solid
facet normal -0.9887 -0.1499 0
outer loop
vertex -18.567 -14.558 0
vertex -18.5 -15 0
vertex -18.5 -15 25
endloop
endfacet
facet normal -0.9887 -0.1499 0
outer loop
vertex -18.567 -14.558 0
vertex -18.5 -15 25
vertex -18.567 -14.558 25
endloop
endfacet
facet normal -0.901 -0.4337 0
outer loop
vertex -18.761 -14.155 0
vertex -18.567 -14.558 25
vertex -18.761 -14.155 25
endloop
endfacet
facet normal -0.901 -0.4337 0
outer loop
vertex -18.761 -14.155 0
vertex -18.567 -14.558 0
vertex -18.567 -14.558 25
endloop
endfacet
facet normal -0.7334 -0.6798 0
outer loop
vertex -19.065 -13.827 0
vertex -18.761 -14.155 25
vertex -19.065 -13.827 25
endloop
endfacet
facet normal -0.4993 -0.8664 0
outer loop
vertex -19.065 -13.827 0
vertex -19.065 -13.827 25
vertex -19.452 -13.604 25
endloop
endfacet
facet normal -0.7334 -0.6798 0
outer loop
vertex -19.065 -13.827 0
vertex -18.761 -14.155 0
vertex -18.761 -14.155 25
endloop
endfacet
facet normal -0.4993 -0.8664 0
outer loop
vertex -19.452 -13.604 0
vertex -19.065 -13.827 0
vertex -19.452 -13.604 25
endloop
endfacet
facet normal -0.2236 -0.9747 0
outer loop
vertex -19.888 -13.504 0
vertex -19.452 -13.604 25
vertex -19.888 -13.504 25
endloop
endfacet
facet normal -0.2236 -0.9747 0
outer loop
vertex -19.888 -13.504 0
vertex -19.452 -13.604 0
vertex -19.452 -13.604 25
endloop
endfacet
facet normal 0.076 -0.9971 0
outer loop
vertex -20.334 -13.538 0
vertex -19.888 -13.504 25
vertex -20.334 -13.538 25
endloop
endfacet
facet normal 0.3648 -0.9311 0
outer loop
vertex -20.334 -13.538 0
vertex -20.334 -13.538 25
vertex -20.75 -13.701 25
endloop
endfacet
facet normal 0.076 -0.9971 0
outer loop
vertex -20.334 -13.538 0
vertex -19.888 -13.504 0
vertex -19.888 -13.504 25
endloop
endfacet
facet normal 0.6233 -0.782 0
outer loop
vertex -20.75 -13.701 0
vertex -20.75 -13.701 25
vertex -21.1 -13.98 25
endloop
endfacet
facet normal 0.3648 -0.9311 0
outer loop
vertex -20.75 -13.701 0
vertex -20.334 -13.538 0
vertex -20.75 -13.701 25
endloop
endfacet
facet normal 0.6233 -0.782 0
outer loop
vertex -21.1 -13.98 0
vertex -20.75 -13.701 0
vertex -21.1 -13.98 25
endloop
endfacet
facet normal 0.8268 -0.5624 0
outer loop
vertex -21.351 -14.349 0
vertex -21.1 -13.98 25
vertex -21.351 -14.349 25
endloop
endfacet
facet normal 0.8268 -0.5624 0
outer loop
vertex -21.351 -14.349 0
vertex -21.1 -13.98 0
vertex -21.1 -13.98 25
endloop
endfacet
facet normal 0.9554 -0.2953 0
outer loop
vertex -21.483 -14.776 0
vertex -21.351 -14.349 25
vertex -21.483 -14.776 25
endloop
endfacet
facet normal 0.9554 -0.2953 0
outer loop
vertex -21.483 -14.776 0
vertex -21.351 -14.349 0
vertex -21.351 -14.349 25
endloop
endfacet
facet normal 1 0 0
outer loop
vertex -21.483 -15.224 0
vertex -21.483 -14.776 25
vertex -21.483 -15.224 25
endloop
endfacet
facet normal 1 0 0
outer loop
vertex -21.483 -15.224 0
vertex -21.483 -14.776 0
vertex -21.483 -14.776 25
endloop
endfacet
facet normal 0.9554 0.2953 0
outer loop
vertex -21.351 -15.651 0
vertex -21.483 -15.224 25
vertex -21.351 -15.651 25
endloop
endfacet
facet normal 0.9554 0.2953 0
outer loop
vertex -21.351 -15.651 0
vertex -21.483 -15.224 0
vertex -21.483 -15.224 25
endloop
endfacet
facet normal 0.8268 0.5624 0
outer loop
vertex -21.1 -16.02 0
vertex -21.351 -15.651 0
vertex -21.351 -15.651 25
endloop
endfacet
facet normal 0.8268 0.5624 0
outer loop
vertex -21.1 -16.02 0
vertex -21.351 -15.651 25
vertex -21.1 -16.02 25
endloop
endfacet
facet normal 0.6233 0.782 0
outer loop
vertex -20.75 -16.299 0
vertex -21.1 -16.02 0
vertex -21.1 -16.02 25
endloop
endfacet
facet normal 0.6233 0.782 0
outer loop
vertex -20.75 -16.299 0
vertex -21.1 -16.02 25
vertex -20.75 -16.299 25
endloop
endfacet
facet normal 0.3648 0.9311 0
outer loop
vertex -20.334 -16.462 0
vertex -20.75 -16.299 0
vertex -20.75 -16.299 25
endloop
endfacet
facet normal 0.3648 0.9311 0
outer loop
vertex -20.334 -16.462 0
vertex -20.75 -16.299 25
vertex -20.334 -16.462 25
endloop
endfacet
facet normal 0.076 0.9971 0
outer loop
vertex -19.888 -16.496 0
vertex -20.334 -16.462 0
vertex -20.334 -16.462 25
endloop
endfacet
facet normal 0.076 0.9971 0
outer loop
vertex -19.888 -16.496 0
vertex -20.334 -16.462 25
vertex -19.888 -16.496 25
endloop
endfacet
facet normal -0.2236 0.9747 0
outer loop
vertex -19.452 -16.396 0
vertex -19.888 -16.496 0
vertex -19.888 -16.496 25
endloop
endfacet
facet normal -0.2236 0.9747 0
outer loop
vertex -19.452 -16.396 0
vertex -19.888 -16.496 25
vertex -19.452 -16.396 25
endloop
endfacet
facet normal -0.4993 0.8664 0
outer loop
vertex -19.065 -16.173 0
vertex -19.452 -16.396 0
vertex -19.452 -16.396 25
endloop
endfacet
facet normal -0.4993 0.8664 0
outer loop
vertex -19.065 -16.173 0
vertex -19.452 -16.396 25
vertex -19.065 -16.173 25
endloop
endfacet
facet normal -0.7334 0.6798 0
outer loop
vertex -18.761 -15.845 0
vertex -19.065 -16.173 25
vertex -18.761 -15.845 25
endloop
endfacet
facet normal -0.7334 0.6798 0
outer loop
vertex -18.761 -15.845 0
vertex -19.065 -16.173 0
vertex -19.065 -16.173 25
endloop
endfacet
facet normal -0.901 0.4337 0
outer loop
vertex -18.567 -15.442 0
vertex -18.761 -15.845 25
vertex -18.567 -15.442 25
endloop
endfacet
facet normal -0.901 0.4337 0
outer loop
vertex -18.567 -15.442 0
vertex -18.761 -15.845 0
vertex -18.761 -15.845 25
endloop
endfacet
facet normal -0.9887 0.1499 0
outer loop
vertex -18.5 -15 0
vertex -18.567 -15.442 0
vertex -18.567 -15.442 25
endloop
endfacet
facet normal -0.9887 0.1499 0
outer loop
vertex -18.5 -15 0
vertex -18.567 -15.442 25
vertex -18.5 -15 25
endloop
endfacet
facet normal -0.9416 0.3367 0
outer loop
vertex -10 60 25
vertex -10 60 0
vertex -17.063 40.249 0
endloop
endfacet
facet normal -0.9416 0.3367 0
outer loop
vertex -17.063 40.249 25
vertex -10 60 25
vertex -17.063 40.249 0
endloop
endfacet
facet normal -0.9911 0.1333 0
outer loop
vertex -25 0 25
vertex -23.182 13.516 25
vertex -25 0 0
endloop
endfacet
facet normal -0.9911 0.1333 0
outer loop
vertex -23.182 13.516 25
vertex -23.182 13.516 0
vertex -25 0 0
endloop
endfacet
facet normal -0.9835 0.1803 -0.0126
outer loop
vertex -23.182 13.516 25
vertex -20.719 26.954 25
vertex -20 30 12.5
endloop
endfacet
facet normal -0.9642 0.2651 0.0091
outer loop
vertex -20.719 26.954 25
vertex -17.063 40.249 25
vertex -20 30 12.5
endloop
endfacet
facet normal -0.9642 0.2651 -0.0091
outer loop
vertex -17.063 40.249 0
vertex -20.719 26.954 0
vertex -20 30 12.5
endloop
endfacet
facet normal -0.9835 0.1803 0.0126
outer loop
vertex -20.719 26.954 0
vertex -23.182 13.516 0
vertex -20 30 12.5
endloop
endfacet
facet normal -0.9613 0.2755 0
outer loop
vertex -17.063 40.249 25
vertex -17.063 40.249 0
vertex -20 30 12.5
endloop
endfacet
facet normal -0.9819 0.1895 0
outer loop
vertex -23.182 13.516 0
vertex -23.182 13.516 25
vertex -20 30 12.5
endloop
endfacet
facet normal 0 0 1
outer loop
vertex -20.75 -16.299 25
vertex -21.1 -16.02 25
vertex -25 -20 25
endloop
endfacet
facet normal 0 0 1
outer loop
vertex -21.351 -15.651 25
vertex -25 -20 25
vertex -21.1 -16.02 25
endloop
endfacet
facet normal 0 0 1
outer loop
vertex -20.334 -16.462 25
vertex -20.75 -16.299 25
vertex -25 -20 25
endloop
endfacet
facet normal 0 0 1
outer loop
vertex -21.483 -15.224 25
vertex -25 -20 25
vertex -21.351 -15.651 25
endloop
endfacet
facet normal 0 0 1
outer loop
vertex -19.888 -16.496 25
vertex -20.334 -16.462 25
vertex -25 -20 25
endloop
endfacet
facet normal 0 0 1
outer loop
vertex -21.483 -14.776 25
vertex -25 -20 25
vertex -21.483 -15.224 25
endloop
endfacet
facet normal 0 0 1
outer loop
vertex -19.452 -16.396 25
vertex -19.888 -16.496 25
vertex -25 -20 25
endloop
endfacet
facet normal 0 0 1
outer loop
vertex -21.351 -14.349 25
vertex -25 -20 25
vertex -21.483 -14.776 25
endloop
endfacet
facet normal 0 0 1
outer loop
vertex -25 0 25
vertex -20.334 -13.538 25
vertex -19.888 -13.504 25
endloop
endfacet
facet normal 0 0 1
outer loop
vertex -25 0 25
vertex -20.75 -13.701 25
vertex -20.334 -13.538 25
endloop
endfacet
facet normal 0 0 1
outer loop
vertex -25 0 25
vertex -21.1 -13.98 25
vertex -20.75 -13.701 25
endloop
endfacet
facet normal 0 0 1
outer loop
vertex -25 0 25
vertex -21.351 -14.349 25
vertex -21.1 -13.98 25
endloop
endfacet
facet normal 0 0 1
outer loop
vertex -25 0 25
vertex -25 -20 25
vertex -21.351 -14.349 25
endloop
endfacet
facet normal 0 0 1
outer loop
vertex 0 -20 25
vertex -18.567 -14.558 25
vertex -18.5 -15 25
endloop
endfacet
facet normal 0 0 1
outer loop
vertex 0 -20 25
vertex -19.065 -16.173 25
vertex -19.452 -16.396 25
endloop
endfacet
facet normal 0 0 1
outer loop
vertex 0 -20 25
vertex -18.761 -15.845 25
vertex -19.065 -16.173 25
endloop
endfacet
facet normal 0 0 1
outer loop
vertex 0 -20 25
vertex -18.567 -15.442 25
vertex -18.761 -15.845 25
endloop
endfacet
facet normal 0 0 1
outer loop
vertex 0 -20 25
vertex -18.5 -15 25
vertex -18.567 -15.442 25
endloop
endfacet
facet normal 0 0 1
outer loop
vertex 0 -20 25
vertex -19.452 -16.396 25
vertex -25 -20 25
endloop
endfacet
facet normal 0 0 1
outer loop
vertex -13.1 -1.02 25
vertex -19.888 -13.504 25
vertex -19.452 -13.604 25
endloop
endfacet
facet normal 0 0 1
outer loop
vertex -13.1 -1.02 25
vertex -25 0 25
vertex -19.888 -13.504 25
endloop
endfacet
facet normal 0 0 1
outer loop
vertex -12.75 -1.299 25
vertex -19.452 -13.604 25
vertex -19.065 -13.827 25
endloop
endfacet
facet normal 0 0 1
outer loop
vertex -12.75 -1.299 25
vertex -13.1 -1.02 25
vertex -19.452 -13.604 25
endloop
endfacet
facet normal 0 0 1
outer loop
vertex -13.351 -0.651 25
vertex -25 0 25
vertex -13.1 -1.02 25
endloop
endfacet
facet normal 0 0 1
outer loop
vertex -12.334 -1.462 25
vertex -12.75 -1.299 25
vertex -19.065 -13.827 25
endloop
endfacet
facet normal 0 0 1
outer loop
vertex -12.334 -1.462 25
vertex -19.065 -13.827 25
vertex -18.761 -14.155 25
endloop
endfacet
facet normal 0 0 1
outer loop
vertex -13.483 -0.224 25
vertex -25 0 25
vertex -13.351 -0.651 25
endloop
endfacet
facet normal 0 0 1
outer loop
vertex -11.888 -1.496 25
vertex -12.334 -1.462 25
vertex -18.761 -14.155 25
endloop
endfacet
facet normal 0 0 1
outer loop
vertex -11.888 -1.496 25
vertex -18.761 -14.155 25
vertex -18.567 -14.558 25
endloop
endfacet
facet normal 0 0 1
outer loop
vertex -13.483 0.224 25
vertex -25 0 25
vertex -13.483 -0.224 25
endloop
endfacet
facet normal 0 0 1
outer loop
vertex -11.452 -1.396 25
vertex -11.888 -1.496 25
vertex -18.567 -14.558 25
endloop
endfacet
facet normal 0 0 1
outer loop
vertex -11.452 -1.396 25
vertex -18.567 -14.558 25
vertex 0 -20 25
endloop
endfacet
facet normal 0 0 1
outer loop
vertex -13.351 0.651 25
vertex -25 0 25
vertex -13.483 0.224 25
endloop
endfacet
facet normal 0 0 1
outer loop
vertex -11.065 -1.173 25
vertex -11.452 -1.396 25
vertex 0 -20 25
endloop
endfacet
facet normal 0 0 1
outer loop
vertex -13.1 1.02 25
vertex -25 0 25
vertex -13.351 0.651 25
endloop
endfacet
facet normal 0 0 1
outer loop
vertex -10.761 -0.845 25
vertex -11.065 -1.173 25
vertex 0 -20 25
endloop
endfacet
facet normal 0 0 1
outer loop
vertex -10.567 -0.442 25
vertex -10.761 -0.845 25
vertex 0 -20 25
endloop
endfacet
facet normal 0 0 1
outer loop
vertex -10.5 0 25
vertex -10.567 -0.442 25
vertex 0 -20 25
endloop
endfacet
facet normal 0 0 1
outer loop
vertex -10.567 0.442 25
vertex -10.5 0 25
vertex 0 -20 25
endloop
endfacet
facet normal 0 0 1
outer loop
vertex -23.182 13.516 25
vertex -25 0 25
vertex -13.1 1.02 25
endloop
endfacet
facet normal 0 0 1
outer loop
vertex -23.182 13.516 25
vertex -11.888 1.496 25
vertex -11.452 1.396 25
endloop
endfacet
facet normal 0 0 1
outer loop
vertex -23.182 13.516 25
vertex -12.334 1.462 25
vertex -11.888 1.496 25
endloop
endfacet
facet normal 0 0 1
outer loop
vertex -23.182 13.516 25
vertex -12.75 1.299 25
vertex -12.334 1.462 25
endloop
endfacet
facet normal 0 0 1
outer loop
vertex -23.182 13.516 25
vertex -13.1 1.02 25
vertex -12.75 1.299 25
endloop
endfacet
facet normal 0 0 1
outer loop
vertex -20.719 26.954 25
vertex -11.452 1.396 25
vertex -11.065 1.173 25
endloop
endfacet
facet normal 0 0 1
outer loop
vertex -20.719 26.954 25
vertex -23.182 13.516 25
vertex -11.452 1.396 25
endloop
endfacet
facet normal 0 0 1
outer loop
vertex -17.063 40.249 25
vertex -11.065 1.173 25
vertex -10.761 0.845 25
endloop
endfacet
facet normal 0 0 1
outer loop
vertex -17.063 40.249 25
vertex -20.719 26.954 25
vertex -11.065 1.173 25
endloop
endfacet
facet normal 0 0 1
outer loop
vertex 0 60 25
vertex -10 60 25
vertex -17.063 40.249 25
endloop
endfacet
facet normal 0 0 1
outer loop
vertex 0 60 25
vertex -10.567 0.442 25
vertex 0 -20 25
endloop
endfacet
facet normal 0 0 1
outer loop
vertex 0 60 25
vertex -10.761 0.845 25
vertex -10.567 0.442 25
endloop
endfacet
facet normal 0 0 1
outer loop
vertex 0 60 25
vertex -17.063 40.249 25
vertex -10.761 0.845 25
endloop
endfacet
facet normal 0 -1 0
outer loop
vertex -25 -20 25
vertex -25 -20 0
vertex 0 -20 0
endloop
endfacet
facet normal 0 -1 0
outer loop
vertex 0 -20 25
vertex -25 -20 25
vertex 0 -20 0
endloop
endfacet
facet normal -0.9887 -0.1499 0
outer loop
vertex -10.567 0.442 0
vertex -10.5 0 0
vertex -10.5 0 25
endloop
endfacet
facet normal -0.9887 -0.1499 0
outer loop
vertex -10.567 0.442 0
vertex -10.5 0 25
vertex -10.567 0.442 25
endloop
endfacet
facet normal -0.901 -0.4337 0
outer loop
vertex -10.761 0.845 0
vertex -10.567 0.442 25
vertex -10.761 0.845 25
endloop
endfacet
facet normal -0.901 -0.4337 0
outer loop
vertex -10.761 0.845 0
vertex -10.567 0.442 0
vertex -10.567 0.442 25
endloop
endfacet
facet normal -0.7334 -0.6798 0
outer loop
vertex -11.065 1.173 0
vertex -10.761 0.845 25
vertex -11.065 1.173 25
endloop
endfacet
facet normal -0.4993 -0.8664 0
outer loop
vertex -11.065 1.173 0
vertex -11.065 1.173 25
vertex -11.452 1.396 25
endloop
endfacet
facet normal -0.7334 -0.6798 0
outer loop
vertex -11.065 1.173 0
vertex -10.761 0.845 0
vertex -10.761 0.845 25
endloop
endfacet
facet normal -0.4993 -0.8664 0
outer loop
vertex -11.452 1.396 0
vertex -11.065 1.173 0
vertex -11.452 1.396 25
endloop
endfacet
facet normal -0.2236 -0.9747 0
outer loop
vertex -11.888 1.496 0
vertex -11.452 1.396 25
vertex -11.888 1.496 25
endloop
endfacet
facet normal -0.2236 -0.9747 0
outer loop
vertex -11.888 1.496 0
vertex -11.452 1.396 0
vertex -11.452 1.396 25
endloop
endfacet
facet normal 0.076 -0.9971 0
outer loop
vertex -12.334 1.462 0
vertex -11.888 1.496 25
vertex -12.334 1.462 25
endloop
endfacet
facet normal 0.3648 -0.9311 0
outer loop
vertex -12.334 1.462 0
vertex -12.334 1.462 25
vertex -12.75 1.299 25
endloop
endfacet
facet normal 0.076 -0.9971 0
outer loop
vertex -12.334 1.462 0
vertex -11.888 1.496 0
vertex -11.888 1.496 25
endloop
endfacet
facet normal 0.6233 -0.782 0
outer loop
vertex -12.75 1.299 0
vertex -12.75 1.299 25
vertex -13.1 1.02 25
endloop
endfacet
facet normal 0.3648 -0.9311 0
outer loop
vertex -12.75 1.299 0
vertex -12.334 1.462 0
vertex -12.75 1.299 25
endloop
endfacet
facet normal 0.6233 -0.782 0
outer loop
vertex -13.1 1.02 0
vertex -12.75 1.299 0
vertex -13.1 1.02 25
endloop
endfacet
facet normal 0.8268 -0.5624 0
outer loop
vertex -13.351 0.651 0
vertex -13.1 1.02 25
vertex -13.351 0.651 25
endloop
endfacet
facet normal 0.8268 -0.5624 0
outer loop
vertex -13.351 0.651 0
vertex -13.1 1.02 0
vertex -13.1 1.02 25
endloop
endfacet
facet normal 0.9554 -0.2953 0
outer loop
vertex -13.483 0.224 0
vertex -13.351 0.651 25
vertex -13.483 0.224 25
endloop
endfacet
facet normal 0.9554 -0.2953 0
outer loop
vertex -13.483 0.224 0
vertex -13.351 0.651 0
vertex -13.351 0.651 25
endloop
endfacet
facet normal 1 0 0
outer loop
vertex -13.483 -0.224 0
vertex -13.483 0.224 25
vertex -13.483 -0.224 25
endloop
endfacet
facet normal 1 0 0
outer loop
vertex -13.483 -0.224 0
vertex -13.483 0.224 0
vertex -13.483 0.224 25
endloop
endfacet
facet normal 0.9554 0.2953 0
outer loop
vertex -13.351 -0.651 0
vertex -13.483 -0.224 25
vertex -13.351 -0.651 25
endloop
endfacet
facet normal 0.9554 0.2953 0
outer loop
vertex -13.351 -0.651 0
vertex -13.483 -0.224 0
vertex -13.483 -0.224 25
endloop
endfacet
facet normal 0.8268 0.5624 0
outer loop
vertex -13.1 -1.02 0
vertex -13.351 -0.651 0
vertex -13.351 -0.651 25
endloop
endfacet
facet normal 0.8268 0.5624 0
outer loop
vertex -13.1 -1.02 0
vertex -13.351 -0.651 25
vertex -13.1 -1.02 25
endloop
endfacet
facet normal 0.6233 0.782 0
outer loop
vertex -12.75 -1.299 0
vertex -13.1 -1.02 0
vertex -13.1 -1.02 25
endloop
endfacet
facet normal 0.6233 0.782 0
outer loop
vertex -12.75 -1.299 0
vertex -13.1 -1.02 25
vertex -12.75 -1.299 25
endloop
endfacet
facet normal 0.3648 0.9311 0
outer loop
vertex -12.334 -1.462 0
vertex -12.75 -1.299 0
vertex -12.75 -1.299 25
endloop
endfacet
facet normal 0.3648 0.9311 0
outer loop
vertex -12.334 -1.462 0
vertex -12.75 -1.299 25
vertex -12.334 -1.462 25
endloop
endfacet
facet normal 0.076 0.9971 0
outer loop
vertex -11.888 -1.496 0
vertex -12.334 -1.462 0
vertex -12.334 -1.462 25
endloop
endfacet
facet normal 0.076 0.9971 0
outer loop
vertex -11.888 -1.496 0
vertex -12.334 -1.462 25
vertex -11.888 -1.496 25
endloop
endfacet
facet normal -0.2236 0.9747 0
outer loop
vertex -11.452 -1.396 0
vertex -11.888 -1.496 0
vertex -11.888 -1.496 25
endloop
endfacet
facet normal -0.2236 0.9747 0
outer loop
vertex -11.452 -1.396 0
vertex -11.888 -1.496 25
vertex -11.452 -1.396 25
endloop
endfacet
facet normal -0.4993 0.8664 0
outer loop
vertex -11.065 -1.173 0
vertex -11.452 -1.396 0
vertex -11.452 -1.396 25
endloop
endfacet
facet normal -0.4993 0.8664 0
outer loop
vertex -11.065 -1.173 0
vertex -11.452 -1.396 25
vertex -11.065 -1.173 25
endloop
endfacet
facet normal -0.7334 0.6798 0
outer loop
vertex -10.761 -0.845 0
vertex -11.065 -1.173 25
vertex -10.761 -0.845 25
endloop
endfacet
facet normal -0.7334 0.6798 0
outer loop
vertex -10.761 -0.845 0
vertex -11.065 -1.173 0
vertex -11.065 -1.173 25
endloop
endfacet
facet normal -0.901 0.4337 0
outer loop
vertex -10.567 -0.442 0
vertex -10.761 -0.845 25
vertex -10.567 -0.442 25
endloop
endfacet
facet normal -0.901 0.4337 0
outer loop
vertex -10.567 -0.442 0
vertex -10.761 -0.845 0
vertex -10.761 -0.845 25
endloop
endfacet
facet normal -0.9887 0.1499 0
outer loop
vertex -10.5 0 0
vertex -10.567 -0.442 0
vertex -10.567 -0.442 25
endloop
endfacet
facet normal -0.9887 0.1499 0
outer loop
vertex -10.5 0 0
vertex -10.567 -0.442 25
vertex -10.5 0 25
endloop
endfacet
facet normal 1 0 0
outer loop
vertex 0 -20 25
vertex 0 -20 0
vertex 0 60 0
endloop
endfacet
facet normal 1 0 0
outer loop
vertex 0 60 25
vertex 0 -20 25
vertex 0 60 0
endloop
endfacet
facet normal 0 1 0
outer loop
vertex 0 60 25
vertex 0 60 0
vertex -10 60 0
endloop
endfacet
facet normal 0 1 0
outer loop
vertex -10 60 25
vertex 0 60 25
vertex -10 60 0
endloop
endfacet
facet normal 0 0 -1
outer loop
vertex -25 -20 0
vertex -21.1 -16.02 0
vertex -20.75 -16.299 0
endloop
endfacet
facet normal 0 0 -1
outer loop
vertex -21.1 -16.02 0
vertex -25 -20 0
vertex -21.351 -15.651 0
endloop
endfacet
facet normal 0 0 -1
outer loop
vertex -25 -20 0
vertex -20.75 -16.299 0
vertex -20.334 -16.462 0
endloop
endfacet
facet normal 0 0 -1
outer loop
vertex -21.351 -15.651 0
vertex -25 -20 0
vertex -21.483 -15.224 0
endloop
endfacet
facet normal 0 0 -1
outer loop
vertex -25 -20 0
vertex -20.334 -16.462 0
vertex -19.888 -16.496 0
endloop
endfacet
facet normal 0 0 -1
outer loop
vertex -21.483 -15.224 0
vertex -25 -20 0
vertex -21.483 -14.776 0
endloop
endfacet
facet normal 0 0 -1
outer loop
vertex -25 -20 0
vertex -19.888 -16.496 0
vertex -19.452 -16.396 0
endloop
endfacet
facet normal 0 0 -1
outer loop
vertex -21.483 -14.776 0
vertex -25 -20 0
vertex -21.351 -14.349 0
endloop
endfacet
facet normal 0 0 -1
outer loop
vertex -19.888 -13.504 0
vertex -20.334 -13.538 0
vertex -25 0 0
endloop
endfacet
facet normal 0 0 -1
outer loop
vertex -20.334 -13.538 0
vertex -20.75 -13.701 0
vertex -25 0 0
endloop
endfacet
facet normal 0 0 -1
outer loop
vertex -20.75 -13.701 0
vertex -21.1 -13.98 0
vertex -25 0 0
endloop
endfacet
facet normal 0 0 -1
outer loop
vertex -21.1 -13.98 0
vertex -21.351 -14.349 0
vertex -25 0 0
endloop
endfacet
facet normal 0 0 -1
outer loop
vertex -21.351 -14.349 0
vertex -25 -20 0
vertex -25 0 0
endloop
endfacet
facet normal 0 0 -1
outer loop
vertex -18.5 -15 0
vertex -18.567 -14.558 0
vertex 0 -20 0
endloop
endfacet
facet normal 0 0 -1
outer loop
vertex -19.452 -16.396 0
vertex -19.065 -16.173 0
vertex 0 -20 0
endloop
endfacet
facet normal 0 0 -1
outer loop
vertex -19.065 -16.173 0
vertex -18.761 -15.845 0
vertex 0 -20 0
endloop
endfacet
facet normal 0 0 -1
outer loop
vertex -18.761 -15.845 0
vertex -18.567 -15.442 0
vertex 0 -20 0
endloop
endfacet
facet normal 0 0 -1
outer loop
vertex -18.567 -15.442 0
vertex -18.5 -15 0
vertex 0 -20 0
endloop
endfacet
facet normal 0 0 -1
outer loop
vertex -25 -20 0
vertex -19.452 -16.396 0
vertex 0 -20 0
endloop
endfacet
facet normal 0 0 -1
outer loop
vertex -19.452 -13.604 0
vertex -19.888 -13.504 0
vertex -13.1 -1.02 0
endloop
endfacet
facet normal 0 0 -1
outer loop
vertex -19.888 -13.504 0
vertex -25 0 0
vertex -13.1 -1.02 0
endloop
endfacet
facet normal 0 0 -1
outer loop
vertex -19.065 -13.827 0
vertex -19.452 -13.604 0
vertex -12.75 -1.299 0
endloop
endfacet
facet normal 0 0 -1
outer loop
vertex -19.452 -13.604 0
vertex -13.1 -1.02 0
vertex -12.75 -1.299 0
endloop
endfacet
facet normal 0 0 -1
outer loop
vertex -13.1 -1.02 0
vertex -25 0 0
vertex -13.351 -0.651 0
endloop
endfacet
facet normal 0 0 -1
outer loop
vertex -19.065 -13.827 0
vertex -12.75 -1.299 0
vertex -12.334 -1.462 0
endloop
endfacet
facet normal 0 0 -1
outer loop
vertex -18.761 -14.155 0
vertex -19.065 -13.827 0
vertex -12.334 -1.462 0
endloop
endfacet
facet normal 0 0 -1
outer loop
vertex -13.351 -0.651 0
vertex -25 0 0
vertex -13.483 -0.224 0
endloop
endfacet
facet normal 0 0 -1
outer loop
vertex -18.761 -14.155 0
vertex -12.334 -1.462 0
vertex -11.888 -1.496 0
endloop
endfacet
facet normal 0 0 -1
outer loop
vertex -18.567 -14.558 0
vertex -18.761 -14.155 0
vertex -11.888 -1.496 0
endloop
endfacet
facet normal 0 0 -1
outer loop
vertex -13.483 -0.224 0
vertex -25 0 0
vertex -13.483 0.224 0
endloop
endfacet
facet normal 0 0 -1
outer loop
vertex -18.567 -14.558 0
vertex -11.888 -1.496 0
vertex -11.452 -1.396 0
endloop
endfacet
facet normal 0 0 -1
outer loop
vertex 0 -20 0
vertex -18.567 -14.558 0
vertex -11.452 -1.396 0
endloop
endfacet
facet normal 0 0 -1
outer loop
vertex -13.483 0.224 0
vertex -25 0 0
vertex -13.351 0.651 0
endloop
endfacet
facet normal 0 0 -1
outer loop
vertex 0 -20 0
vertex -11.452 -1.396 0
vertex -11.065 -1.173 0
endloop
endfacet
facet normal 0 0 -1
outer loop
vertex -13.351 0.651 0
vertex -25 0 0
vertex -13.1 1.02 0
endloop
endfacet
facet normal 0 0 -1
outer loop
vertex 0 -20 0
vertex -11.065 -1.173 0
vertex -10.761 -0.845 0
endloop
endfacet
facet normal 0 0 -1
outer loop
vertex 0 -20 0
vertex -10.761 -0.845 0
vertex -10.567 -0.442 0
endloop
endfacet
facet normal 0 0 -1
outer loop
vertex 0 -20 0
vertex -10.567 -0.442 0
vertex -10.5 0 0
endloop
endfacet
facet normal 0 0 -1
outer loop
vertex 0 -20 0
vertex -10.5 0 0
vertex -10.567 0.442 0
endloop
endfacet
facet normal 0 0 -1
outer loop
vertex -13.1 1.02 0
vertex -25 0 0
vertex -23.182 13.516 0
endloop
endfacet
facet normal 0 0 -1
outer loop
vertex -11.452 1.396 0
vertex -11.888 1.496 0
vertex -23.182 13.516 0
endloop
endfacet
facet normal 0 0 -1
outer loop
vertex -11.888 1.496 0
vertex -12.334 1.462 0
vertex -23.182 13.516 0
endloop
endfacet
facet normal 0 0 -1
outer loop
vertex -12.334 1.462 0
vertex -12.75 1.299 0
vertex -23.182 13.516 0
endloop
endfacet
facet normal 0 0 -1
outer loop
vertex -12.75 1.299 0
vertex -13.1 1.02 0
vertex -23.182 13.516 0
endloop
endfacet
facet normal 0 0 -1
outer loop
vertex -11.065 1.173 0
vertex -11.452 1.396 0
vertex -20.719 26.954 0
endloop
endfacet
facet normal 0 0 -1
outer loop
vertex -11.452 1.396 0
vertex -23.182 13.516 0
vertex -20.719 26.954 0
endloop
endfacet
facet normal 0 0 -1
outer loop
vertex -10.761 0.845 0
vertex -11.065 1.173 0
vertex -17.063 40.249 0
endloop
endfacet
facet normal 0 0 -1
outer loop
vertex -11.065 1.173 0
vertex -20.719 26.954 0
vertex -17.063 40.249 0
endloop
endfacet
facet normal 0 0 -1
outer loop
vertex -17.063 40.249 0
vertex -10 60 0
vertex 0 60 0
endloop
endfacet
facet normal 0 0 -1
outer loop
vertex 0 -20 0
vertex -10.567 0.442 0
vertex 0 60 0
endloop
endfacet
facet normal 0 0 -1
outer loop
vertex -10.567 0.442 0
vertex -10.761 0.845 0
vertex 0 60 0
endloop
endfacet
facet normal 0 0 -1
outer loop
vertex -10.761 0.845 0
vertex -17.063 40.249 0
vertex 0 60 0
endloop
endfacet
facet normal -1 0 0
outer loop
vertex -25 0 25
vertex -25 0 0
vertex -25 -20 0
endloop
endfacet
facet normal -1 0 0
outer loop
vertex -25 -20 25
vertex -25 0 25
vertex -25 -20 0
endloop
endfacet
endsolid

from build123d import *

# Parameters (mm, degrees)
F0_R     = 1.5
F1_DEPTH = 25


with BuildPart() as f1:
    # F0 (on Top) → F1 (new body)
    with BuildSketch(Plane.XY):
        with BuildLine():
            Line((0, -20), (0, 0))
            Line((0, 0), (0, 60))
            Line((0, 60), (-10, 60))
            add(Edge.make_bspline(
                [(-10, 60), (-13.7457798028, 50.0496833938), (-21.165039581, 30.3411079665), (-23.7300116456, 10.047783958), (-25, 0)],
                knots=[0, 0, 0, 0, 0.5048724421, 1, 1, 1, 1], degree=3))
            Line((-25, 0), (-25, -20))
            Line((-25, -20), (0, -20))
        make_face()
        with Locations((-20, -15)):
            Circle(F0_R, mode=Mode.SUBTRACT)
        with Locations((-12, 0)):
            Circle(F0_R, mode=Mode.SUBTRACT)
    extrude(amount=F1_DEPTH)


solid = f1.part
